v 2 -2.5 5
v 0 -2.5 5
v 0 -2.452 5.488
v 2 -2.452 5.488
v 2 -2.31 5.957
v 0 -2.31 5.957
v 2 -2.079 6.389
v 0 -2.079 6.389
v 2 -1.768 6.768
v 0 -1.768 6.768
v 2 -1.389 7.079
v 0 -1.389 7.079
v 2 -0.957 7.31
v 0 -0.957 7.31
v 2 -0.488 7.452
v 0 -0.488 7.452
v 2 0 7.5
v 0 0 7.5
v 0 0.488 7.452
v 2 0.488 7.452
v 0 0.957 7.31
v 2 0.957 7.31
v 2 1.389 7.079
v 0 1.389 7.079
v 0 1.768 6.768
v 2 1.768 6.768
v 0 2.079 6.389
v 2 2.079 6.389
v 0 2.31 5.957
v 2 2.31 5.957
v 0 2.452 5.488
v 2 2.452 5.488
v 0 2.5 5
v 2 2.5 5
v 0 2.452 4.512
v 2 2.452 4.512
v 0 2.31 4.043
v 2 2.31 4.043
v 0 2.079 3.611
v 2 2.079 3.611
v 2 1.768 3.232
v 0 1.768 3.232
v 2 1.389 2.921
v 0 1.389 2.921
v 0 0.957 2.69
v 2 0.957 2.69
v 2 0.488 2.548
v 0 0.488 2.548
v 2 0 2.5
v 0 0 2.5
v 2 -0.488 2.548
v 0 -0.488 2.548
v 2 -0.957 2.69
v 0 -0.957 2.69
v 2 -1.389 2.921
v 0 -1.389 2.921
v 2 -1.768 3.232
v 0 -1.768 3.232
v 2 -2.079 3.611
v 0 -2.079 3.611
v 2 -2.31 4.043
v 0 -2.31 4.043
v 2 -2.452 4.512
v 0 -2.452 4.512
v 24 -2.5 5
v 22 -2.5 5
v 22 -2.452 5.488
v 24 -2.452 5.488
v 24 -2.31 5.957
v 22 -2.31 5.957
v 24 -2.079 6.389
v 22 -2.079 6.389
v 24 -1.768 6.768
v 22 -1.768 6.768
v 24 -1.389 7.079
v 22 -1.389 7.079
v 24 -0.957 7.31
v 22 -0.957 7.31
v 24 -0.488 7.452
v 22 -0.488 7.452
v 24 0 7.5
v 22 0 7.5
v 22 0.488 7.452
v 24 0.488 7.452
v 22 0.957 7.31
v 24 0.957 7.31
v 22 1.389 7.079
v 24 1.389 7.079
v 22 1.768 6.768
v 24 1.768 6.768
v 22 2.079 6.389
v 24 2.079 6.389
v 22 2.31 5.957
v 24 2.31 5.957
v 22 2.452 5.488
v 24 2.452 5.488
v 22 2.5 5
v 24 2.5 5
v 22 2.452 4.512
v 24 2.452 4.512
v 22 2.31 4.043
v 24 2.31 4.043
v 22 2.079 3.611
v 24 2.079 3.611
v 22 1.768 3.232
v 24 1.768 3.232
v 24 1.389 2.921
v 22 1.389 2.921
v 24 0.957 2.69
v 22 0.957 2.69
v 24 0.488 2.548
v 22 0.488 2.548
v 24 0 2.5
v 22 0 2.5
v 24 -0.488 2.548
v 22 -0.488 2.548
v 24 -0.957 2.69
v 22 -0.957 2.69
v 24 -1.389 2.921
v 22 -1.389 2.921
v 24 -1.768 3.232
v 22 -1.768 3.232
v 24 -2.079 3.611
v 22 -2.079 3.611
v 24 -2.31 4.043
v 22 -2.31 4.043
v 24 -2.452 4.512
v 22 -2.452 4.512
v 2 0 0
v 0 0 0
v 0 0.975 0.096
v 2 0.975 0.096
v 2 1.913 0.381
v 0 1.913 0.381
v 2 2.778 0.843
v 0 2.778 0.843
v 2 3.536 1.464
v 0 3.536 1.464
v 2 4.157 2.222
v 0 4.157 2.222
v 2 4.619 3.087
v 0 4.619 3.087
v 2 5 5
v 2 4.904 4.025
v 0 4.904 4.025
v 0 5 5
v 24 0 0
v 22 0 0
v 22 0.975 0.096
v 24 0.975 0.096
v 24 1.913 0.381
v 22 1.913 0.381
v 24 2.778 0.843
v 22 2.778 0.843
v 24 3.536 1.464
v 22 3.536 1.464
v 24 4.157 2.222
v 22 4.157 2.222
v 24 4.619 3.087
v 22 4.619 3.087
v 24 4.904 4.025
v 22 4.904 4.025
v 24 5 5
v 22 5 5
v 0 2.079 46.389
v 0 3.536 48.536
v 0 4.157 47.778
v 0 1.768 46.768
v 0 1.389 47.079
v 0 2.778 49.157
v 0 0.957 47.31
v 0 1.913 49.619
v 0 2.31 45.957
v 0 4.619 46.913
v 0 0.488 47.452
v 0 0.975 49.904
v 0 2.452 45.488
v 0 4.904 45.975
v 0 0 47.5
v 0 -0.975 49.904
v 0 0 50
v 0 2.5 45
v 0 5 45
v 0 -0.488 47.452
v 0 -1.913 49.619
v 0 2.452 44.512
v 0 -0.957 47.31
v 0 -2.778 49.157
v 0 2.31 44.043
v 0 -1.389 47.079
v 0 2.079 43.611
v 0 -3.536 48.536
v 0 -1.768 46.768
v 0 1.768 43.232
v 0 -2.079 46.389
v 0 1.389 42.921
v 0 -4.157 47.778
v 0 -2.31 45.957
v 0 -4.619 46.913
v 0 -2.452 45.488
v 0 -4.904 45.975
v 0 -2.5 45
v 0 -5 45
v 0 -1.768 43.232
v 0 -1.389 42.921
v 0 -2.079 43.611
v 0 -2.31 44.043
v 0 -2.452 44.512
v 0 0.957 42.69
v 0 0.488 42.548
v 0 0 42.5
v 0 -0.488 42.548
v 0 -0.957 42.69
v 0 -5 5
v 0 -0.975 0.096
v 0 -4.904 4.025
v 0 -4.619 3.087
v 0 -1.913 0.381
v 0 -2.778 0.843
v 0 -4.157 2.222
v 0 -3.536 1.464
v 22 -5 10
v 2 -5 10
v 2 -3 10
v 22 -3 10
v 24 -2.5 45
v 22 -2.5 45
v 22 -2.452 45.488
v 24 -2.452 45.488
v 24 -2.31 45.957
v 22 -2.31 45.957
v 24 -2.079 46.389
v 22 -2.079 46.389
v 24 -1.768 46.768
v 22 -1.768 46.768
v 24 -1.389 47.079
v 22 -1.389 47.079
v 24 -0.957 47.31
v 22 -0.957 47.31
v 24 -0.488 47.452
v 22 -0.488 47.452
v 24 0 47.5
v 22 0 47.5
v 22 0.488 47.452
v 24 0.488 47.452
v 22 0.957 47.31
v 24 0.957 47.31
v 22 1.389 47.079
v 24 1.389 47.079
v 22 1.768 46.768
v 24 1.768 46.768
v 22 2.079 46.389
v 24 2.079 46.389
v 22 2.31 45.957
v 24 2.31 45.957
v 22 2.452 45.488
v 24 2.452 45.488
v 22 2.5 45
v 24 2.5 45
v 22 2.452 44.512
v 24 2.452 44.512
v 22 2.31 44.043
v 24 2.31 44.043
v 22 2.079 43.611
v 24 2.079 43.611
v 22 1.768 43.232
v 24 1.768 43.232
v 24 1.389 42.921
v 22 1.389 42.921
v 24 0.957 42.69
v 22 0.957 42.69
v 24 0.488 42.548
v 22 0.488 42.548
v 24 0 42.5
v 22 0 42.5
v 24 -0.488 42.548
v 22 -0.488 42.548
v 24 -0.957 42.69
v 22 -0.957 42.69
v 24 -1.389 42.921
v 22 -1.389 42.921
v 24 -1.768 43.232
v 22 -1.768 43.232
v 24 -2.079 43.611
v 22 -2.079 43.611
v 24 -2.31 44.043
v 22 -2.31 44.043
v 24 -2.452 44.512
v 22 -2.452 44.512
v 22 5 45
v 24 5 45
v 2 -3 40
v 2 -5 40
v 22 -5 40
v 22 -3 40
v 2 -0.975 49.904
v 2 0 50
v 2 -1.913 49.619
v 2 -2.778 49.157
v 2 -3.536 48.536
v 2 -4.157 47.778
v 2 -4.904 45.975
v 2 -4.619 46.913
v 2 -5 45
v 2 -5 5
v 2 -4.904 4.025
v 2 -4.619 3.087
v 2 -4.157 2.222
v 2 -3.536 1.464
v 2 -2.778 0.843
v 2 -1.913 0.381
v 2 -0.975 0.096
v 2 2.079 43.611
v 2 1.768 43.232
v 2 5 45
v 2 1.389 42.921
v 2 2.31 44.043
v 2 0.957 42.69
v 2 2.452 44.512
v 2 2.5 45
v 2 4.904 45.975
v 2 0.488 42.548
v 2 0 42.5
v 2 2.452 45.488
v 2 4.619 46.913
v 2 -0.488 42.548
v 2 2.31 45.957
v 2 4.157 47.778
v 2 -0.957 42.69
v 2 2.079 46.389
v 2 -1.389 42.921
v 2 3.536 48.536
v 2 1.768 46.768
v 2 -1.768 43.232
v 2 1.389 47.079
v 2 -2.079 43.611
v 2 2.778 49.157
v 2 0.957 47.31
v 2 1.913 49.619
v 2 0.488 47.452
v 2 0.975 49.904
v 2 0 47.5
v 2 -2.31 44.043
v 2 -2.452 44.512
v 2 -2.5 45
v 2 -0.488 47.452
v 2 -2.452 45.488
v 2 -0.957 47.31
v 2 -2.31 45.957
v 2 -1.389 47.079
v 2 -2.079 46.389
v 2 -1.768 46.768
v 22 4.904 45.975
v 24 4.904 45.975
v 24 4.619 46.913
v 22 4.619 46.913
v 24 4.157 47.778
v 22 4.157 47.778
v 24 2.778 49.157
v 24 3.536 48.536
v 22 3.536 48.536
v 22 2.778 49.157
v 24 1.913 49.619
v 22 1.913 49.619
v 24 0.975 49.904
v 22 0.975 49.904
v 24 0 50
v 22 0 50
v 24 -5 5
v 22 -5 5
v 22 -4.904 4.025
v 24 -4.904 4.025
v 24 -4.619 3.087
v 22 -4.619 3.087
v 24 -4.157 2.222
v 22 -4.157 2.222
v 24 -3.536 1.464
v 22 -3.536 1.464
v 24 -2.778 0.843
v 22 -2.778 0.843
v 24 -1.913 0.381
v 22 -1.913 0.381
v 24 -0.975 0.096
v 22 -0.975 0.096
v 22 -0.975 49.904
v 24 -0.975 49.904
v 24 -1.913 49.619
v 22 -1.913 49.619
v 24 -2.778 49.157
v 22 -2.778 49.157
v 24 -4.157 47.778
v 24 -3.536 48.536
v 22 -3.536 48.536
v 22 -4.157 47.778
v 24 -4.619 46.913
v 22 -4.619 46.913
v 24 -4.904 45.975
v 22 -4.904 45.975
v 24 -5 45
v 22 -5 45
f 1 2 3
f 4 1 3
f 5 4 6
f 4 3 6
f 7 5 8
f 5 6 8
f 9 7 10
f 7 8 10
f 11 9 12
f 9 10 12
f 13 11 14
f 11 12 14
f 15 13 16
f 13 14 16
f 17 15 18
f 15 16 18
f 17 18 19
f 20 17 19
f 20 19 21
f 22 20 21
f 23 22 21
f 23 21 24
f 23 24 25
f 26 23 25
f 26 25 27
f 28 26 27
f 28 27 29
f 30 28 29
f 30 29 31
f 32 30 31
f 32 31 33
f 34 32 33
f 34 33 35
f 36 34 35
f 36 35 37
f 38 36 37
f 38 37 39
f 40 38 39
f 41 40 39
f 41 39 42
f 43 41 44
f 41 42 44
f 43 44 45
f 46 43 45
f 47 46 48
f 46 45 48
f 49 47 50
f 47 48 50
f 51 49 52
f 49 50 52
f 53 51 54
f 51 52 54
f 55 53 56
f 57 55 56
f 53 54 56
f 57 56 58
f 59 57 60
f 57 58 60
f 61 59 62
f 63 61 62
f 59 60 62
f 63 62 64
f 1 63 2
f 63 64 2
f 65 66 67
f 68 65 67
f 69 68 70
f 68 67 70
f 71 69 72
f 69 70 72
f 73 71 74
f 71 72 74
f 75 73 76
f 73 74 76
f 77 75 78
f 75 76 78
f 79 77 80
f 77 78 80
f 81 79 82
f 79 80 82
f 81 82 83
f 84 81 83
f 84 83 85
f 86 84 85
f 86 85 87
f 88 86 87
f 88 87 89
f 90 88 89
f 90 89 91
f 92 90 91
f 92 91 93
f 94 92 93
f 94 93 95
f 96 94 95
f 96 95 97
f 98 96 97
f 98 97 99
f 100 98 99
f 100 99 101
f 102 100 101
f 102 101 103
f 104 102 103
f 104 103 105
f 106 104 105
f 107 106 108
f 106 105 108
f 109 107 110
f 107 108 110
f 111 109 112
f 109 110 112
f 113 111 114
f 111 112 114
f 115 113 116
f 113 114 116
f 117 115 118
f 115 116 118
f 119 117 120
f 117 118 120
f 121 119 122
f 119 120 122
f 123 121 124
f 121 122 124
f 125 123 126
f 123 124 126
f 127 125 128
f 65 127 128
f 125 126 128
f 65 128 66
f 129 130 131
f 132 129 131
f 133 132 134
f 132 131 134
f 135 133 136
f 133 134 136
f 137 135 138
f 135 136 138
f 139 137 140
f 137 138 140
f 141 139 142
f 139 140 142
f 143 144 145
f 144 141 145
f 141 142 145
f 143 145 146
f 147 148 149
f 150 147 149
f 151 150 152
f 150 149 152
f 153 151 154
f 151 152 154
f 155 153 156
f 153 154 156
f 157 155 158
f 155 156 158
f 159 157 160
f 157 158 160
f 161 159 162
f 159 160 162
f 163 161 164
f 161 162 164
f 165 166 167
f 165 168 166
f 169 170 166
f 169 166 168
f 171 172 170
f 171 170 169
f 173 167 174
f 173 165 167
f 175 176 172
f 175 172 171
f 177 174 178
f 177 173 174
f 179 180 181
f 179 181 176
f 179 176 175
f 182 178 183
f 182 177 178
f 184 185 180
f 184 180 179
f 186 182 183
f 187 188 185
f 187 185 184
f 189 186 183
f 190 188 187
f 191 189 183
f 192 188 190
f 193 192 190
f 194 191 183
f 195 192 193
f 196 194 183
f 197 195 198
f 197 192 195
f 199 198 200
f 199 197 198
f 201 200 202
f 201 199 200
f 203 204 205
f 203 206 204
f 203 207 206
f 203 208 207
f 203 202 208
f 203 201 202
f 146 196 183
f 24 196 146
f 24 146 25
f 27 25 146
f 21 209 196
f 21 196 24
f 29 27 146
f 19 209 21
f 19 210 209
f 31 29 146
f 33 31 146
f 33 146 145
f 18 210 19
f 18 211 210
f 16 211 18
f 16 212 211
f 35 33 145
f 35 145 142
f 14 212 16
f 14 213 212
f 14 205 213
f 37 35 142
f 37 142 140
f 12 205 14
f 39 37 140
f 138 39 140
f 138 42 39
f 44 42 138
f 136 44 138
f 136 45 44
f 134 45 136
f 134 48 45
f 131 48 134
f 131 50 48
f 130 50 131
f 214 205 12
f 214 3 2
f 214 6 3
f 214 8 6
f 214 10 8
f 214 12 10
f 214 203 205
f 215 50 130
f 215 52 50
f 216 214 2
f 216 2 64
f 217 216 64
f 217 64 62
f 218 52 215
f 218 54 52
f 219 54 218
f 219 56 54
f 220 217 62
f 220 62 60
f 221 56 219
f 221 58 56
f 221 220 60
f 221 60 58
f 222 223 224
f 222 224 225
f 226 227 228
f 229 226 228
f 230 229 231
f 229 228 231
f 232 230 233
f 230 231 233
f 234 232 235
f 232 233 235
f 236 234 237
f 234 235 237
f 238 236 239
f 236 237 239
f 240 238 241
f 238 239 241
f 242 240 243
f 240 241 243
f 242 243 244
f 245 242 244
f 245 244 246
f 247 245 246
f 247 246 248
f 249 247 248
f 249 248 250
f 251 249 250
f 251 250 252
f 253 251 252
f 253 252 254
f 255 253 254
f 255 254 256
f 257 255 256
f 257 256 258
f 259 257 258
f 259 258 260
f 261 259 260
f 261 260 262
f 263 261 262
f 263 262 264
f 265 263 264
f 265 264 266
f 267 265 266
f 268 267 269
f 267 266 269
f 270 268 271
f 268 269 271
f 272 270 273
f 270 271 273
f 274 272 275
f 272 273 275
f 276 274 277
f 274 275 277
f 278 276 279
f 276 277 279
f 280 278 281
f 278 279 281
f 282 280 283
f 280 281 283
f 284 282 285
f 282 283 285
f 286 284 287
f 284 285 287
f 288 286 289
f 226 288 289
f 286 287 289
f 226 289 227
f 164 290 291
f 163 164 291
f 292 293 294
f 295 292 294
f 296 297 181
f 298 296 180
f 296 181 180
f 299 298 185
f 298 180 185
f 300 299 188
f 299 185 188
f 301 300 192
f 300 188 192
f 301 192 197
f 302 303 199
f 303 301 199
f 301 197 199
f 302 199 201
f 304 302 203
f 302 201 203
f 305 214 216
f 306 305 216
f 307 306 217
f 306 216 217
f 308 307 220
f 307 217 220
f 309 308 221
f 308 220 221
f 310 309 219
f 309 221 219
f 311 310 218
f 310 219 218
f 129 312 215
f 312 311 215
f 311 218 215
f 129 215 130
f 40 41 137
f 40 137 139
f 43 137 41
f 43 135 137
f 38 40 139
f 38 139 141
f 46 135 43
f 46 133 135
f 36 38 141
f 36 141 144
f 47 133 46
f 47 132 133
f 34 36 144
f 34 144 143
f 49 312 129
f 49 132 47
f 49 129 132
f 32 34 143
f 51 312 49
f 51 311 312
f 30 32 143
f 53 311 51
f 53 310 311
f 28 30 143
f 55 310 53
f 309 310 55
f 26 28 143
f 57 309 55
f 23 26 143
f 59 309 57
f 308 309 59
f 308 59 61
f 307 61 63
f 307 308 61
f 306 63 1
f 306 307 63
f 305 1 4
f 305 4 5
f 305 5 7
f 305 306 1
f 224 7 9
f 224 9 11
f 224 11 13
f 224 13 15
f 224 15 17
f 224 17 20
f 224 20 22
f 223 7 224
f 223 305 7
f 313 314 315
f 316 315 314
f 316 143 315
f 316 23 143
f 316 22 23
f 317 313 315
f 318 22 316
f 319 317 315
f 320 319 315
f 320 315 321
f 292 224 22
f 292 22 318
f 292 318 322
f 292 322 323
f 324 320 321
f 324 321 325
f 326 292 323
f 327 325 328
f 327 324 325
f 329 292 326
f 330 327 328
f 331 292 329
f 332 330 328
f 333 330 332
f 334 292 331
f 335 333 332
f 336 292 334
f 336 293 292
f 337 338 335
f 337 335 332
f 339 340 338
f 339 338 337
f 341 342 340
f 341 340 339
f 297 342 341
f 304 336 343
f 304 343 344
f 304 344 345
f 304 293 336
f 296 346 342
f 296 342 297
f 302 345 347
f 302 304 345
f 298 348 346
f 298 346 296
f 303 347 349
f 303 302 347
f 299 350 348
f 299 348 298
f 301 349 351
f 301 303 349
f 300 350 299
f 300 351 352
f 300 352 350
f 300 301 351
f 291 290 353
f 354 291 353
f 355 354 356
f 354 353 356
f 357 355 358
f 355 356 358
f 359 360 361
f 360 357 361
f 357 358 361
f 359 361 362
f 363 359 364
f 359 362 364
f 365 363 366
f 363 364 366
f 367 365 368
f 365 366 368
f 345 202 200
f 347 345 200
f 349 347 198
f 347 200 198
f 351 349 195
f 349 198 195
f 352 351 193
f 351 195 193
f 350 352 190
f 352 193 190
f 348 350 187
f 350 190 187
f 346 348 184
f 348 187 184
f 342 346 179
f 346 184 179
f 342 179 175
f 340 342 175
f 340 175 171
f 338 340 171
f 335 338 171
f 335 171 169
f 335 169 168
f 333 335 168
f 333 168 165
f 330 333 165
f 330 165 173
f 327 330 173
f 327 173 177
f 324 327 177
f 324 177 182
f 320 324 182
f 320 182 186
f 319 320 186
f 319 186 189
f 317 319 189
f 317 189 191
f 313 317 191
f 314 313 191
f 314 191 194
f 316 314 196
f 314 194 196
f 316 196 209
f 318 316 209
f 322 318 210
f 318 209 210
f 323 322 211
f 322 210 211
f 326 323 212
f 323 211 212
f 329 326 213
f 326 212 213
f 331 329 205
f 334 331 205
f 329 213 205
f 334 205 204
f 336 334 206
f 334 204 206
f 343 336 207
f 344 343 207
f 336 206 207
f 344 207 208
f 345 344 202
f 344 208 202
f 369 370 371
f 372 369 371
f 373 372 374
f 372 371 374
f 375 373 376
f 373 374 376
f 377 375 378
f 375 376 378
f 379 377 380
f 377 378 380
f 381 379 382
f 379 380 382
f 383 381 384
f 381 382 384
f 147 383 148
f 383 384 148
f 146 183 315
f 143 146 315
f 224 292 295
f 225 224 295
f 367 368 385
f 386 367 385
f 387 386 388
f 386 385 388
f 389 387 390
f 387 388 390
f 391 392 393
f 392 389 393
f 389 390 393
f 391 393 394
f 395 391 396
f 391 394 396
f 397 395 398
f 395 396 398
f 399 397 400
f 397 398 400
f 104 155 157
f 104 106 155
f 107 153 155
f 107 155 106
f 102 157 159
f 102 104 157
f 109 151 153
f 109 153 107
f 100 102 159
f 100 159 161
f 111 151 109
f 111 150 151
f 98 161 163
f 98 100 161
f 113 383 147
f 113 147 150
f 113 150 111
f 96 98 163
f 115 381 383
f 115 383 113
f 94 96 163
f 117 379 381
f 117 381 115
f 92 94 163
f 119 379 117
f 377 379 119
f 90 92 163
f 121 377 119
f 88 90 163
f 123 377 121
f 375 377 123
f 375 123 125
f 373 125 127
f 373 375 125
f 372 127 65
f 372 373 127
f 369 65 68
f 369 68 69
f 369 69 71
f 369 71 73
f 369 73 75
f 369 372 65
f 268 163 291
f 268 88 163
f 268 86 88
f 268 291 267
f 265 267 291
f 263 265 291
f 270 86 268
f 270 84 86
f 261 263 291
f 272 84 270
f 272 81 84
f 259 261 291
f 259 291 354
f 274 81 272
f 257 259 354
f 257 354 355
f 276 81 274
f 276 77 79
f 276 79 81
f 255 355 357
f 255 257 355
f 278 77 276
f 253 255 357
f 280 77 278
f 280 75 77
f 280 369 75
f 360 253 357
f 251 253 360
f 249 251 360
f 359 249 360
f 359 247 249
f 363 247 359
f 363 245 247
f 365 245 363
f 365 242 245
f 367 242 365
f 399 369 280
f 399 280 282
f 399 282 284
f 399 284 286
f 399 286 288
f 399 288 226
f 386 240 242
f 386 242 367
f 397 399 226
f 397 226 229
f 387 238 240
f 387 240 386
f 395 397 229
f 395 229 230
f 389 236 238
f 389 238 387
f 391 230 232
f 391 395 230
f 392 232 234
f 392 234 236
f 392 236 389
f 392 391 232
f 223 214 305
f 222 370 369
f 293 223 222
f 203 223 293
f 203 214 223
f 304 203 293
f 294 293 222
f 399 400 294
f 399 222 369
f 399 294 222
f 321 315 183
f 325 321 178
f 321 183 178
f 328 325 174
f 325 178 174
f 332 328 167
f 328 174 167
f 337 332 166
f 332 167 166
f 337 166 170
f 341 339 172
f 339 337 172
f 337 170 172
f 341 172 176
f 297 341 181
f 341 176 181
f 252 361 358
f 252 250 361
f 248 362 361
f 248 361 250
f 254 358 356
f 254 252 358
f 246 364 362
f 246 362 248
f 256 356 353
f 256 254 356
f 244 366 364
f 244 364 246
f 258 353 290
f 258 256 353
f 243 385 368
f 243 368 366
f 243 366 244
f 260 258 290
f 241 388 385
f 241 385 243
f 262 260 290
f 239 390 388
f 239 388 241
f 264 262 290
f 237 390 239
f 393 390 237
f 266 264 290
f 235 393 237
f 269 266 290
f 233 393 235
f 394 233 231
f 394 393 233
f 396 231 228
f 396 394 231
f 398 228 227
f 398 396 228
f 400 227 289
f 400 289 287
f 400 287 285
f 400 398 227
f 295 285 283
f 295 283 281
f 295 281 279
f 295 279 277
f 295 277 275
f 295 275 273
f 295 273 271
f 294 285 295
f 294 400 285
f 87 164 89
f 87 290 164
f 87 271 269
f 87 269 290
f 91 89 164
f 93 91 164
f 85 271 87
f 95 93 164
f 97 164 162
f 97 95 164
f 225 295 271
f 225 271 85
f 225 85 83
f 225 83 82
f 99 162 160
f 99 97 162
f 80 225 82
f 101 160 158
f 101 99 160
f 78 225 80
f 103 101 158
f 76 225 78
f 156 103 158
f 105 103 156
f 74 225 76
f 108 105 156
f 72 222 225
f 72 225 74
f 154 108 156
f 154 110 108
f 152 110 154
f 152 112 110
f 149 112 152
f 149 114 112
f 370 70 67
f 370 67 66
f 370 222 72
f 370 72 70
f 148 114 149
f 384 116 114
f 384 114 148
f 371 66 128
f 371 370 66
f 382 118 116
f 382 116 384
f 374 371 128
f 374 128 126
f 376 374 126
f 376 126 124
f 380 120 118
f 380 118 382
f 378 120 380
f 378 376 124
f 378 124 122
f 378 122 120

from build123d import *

# Parameters (mm, degrees)
F1_DEPTH  = 5
F3_DEPTH  = 25
F5_DEPTH  = 25
F6_R      = 2.5
F7_DEPTH  = 25
F8_R      = 2.5
F9_DEPTH  = 25
F10_W     = 20
F10_H     = 30
F11_DEPTH = 2
F13_R     = 2.5
F14_DEPTH = 10


with BuildPart() as f1:
    # F0 (on Front) → F1 (new body, symmetric)
    with BuildSketch(Plane.XZ):
        Polygon((0, 50), (0, 0), (2, 0), (2, 10), (2, 40), (2, 50), align=None)
    extrude(amount=F1_DEPTH, both=True)


with BuildPart() as f1b:
    # F0 (on Front) → F1, piece 2 (new body, symmetric)
    with BuildSketch(Plane.XZ):
        Polygon((22, 40), (22, 10), (22, 0), (24, 0), (24, 50), (22, 50), align=None)
    extrude(amount=F1_DEPTH, both=True)


with BuildPart() as f3_tool:
    # F2 (on face) → F3 (new body)
    with BuildSketch(Plane(origin=(0, 0, 0), x_dir=(0, -1, 0), z_dir=(-1, 0, 0))):
        with BuildLine():
            ThreePointArc((5, 5), (3.5355339059, 1.4644660941), (0, 0))
            Line((0, 0), (5, 0))
            Line((5, 0), (5, 5))
        make_face()
        with BuildLine():
            ThreePointArc((0, 0), (-3.5355339059, 1.4644660941), (-5, 5))
            Line((-5, 5), (-5, 0))
            Line((-5, 0), (0, 0))
        make_face()
    extrude(amount=-F3_DEPTH)


with BuildPart() as f1_1:
    add(f1.part)

    # F3: cut by f3_tool
    add(f3_tool.part, mode=Mode.SUBTRACT)


with BuildPart() as f1b_1:
    add(f1b.part)

    # F3: cut by f3_tool
    add(f3_tool.part, mode=Mode.SUBTRACT)


with BuildPart() as f5_tool:
    # F4 (on face) → F5 (new body)
    with BuildSketch(Plane(origin=(0, 0, 0), x_dir=(0, -1, 0), z_dir=(-1, 0, 0))):
        with BuildLine():
            ThreePointArc((-5, 45), (-3.5355339059, 48.5355339059), (0, 50))
            Line((0, 50), (-5, 50))
            Line((-5, 50), (-5, 45))
        make_face()
        with BuildLine():
            ThreePointArc((0, 50), (3.5355339059, 48.5355339059), (5, 45))
            Line((5, 45), (5, 50))
            Line((5, 50), (0, 50))
        make_face()
    extrude(amount=-F5_DEPTH)


with BuildPart() as f1_2:
    add(f1_1.part)

    # F5: cut by f5_tool
    add(f5_tool.part, mode=Mode.SUBTRACT)


with BuildPart() as f1b_2:
    add(f1b_1.part)

    # F5: cut by f5_tool
    add(f5_tool.part, mode=Mode.SUBTRACT)


with BuildPart() as f7_tool:
    # F6 (on face) → F7 (new body)
    with BuildSketch(Plane(origin=(0, 0, 0), x_dir=(0, -1, 0), z_dir=(-1, 0, 0))):
        with Locations((0, 45)):
            Circle(F6_R)
    extrude(amount=-F7_DEPTH)


with BuildPart() as f1_3:
    add(f1_2.part)

    # F7: cut by f7_tool
    add(f7_tool.part, mode=Mode.SUBTRACT)


with BuildPart() as f1b_3:
    add(f1b_2.part)

    # F7: cut by f7_tool
    add(f7_tool.part, mode=Mode.SUBTRACT)


with BuildPart() as f9_tool:
    # F8 (on face) → F9 (new body)
    with BuildSketch(Plane(origin=(0, 0, 0), x_dir=(0, -1, 0), z_dir=(-1, 0, 0))):
        with Locations((0, 5)):
            Circle(F8_R)
    extrude(amount=-F9_DEPTH)


with BuildPart() as f1_4:
    add(f1_3.part)

    # F9: cut by f9_tool
    add(f9_tool.part, mode=Mode.SUBTRACT)


with BuildPart() as f1b_4:
    add(f1b_3.part)

    # F9: cut by f9_tool
    add(f9_tool.part, mode=Mode.SUBTRACT)


with BuildPart() as f11:
    # F10 (on face) → F11 (new body)
    with BuildSketch(Plane.XZ.offset(5)):
        with Locations((12, 25)):
            Rectangle(F10_W, F10_H)
    extrude(amount=-F11_DEPTH)


with BuildPart() as f1_5:
    add(f1_4.part)

    # F12: union F1b, F11
    add(f1b_4.part)
    add(f11.part)

    # F13 (on face) → F14 (cut)
    with BuildSketch(Plane.YZ.offset(24)):
        with BuildLine():
            ThreePointArc((-5, 45), (-3.5355339059, 48.5355339059), (0, 50))
            Line((0, 50), (-5, 50))
            Line((-5, 50), (-5, 45))
        make_face()
        with BuildLine():
            ThreePointArc((0, 50), (3.5355339059, 48.5355339059), (5, 45))
            Line((5, 45), (5, 50))
            Line((5, 50), (0, 50))
        make_face()
        with Locations((0, 45)):
            Circle(F13_R)
        with BuildLine():
            ThreePointArc((5, 5), (3.5355339059, 1.4644660941), (0, 0))
            Line((0, 0), (5, 0))
            Line((5, 0), (5, 5))
        make_face()
        with BuildLine():
            ThreePointArc((0, 0), (-3.5355339059, 1.4644660941), (-5, 5))
            Line((-5, 5), (-5, 0))
            Line((-5, 0), (0, 0))
        make_face()
        with Locations((0, 5)):
            Circle(F13_R)
    extrude(amount=-F14_DEPTH, mode=Mode.SUBTRACT)


solid = f1_5.part
